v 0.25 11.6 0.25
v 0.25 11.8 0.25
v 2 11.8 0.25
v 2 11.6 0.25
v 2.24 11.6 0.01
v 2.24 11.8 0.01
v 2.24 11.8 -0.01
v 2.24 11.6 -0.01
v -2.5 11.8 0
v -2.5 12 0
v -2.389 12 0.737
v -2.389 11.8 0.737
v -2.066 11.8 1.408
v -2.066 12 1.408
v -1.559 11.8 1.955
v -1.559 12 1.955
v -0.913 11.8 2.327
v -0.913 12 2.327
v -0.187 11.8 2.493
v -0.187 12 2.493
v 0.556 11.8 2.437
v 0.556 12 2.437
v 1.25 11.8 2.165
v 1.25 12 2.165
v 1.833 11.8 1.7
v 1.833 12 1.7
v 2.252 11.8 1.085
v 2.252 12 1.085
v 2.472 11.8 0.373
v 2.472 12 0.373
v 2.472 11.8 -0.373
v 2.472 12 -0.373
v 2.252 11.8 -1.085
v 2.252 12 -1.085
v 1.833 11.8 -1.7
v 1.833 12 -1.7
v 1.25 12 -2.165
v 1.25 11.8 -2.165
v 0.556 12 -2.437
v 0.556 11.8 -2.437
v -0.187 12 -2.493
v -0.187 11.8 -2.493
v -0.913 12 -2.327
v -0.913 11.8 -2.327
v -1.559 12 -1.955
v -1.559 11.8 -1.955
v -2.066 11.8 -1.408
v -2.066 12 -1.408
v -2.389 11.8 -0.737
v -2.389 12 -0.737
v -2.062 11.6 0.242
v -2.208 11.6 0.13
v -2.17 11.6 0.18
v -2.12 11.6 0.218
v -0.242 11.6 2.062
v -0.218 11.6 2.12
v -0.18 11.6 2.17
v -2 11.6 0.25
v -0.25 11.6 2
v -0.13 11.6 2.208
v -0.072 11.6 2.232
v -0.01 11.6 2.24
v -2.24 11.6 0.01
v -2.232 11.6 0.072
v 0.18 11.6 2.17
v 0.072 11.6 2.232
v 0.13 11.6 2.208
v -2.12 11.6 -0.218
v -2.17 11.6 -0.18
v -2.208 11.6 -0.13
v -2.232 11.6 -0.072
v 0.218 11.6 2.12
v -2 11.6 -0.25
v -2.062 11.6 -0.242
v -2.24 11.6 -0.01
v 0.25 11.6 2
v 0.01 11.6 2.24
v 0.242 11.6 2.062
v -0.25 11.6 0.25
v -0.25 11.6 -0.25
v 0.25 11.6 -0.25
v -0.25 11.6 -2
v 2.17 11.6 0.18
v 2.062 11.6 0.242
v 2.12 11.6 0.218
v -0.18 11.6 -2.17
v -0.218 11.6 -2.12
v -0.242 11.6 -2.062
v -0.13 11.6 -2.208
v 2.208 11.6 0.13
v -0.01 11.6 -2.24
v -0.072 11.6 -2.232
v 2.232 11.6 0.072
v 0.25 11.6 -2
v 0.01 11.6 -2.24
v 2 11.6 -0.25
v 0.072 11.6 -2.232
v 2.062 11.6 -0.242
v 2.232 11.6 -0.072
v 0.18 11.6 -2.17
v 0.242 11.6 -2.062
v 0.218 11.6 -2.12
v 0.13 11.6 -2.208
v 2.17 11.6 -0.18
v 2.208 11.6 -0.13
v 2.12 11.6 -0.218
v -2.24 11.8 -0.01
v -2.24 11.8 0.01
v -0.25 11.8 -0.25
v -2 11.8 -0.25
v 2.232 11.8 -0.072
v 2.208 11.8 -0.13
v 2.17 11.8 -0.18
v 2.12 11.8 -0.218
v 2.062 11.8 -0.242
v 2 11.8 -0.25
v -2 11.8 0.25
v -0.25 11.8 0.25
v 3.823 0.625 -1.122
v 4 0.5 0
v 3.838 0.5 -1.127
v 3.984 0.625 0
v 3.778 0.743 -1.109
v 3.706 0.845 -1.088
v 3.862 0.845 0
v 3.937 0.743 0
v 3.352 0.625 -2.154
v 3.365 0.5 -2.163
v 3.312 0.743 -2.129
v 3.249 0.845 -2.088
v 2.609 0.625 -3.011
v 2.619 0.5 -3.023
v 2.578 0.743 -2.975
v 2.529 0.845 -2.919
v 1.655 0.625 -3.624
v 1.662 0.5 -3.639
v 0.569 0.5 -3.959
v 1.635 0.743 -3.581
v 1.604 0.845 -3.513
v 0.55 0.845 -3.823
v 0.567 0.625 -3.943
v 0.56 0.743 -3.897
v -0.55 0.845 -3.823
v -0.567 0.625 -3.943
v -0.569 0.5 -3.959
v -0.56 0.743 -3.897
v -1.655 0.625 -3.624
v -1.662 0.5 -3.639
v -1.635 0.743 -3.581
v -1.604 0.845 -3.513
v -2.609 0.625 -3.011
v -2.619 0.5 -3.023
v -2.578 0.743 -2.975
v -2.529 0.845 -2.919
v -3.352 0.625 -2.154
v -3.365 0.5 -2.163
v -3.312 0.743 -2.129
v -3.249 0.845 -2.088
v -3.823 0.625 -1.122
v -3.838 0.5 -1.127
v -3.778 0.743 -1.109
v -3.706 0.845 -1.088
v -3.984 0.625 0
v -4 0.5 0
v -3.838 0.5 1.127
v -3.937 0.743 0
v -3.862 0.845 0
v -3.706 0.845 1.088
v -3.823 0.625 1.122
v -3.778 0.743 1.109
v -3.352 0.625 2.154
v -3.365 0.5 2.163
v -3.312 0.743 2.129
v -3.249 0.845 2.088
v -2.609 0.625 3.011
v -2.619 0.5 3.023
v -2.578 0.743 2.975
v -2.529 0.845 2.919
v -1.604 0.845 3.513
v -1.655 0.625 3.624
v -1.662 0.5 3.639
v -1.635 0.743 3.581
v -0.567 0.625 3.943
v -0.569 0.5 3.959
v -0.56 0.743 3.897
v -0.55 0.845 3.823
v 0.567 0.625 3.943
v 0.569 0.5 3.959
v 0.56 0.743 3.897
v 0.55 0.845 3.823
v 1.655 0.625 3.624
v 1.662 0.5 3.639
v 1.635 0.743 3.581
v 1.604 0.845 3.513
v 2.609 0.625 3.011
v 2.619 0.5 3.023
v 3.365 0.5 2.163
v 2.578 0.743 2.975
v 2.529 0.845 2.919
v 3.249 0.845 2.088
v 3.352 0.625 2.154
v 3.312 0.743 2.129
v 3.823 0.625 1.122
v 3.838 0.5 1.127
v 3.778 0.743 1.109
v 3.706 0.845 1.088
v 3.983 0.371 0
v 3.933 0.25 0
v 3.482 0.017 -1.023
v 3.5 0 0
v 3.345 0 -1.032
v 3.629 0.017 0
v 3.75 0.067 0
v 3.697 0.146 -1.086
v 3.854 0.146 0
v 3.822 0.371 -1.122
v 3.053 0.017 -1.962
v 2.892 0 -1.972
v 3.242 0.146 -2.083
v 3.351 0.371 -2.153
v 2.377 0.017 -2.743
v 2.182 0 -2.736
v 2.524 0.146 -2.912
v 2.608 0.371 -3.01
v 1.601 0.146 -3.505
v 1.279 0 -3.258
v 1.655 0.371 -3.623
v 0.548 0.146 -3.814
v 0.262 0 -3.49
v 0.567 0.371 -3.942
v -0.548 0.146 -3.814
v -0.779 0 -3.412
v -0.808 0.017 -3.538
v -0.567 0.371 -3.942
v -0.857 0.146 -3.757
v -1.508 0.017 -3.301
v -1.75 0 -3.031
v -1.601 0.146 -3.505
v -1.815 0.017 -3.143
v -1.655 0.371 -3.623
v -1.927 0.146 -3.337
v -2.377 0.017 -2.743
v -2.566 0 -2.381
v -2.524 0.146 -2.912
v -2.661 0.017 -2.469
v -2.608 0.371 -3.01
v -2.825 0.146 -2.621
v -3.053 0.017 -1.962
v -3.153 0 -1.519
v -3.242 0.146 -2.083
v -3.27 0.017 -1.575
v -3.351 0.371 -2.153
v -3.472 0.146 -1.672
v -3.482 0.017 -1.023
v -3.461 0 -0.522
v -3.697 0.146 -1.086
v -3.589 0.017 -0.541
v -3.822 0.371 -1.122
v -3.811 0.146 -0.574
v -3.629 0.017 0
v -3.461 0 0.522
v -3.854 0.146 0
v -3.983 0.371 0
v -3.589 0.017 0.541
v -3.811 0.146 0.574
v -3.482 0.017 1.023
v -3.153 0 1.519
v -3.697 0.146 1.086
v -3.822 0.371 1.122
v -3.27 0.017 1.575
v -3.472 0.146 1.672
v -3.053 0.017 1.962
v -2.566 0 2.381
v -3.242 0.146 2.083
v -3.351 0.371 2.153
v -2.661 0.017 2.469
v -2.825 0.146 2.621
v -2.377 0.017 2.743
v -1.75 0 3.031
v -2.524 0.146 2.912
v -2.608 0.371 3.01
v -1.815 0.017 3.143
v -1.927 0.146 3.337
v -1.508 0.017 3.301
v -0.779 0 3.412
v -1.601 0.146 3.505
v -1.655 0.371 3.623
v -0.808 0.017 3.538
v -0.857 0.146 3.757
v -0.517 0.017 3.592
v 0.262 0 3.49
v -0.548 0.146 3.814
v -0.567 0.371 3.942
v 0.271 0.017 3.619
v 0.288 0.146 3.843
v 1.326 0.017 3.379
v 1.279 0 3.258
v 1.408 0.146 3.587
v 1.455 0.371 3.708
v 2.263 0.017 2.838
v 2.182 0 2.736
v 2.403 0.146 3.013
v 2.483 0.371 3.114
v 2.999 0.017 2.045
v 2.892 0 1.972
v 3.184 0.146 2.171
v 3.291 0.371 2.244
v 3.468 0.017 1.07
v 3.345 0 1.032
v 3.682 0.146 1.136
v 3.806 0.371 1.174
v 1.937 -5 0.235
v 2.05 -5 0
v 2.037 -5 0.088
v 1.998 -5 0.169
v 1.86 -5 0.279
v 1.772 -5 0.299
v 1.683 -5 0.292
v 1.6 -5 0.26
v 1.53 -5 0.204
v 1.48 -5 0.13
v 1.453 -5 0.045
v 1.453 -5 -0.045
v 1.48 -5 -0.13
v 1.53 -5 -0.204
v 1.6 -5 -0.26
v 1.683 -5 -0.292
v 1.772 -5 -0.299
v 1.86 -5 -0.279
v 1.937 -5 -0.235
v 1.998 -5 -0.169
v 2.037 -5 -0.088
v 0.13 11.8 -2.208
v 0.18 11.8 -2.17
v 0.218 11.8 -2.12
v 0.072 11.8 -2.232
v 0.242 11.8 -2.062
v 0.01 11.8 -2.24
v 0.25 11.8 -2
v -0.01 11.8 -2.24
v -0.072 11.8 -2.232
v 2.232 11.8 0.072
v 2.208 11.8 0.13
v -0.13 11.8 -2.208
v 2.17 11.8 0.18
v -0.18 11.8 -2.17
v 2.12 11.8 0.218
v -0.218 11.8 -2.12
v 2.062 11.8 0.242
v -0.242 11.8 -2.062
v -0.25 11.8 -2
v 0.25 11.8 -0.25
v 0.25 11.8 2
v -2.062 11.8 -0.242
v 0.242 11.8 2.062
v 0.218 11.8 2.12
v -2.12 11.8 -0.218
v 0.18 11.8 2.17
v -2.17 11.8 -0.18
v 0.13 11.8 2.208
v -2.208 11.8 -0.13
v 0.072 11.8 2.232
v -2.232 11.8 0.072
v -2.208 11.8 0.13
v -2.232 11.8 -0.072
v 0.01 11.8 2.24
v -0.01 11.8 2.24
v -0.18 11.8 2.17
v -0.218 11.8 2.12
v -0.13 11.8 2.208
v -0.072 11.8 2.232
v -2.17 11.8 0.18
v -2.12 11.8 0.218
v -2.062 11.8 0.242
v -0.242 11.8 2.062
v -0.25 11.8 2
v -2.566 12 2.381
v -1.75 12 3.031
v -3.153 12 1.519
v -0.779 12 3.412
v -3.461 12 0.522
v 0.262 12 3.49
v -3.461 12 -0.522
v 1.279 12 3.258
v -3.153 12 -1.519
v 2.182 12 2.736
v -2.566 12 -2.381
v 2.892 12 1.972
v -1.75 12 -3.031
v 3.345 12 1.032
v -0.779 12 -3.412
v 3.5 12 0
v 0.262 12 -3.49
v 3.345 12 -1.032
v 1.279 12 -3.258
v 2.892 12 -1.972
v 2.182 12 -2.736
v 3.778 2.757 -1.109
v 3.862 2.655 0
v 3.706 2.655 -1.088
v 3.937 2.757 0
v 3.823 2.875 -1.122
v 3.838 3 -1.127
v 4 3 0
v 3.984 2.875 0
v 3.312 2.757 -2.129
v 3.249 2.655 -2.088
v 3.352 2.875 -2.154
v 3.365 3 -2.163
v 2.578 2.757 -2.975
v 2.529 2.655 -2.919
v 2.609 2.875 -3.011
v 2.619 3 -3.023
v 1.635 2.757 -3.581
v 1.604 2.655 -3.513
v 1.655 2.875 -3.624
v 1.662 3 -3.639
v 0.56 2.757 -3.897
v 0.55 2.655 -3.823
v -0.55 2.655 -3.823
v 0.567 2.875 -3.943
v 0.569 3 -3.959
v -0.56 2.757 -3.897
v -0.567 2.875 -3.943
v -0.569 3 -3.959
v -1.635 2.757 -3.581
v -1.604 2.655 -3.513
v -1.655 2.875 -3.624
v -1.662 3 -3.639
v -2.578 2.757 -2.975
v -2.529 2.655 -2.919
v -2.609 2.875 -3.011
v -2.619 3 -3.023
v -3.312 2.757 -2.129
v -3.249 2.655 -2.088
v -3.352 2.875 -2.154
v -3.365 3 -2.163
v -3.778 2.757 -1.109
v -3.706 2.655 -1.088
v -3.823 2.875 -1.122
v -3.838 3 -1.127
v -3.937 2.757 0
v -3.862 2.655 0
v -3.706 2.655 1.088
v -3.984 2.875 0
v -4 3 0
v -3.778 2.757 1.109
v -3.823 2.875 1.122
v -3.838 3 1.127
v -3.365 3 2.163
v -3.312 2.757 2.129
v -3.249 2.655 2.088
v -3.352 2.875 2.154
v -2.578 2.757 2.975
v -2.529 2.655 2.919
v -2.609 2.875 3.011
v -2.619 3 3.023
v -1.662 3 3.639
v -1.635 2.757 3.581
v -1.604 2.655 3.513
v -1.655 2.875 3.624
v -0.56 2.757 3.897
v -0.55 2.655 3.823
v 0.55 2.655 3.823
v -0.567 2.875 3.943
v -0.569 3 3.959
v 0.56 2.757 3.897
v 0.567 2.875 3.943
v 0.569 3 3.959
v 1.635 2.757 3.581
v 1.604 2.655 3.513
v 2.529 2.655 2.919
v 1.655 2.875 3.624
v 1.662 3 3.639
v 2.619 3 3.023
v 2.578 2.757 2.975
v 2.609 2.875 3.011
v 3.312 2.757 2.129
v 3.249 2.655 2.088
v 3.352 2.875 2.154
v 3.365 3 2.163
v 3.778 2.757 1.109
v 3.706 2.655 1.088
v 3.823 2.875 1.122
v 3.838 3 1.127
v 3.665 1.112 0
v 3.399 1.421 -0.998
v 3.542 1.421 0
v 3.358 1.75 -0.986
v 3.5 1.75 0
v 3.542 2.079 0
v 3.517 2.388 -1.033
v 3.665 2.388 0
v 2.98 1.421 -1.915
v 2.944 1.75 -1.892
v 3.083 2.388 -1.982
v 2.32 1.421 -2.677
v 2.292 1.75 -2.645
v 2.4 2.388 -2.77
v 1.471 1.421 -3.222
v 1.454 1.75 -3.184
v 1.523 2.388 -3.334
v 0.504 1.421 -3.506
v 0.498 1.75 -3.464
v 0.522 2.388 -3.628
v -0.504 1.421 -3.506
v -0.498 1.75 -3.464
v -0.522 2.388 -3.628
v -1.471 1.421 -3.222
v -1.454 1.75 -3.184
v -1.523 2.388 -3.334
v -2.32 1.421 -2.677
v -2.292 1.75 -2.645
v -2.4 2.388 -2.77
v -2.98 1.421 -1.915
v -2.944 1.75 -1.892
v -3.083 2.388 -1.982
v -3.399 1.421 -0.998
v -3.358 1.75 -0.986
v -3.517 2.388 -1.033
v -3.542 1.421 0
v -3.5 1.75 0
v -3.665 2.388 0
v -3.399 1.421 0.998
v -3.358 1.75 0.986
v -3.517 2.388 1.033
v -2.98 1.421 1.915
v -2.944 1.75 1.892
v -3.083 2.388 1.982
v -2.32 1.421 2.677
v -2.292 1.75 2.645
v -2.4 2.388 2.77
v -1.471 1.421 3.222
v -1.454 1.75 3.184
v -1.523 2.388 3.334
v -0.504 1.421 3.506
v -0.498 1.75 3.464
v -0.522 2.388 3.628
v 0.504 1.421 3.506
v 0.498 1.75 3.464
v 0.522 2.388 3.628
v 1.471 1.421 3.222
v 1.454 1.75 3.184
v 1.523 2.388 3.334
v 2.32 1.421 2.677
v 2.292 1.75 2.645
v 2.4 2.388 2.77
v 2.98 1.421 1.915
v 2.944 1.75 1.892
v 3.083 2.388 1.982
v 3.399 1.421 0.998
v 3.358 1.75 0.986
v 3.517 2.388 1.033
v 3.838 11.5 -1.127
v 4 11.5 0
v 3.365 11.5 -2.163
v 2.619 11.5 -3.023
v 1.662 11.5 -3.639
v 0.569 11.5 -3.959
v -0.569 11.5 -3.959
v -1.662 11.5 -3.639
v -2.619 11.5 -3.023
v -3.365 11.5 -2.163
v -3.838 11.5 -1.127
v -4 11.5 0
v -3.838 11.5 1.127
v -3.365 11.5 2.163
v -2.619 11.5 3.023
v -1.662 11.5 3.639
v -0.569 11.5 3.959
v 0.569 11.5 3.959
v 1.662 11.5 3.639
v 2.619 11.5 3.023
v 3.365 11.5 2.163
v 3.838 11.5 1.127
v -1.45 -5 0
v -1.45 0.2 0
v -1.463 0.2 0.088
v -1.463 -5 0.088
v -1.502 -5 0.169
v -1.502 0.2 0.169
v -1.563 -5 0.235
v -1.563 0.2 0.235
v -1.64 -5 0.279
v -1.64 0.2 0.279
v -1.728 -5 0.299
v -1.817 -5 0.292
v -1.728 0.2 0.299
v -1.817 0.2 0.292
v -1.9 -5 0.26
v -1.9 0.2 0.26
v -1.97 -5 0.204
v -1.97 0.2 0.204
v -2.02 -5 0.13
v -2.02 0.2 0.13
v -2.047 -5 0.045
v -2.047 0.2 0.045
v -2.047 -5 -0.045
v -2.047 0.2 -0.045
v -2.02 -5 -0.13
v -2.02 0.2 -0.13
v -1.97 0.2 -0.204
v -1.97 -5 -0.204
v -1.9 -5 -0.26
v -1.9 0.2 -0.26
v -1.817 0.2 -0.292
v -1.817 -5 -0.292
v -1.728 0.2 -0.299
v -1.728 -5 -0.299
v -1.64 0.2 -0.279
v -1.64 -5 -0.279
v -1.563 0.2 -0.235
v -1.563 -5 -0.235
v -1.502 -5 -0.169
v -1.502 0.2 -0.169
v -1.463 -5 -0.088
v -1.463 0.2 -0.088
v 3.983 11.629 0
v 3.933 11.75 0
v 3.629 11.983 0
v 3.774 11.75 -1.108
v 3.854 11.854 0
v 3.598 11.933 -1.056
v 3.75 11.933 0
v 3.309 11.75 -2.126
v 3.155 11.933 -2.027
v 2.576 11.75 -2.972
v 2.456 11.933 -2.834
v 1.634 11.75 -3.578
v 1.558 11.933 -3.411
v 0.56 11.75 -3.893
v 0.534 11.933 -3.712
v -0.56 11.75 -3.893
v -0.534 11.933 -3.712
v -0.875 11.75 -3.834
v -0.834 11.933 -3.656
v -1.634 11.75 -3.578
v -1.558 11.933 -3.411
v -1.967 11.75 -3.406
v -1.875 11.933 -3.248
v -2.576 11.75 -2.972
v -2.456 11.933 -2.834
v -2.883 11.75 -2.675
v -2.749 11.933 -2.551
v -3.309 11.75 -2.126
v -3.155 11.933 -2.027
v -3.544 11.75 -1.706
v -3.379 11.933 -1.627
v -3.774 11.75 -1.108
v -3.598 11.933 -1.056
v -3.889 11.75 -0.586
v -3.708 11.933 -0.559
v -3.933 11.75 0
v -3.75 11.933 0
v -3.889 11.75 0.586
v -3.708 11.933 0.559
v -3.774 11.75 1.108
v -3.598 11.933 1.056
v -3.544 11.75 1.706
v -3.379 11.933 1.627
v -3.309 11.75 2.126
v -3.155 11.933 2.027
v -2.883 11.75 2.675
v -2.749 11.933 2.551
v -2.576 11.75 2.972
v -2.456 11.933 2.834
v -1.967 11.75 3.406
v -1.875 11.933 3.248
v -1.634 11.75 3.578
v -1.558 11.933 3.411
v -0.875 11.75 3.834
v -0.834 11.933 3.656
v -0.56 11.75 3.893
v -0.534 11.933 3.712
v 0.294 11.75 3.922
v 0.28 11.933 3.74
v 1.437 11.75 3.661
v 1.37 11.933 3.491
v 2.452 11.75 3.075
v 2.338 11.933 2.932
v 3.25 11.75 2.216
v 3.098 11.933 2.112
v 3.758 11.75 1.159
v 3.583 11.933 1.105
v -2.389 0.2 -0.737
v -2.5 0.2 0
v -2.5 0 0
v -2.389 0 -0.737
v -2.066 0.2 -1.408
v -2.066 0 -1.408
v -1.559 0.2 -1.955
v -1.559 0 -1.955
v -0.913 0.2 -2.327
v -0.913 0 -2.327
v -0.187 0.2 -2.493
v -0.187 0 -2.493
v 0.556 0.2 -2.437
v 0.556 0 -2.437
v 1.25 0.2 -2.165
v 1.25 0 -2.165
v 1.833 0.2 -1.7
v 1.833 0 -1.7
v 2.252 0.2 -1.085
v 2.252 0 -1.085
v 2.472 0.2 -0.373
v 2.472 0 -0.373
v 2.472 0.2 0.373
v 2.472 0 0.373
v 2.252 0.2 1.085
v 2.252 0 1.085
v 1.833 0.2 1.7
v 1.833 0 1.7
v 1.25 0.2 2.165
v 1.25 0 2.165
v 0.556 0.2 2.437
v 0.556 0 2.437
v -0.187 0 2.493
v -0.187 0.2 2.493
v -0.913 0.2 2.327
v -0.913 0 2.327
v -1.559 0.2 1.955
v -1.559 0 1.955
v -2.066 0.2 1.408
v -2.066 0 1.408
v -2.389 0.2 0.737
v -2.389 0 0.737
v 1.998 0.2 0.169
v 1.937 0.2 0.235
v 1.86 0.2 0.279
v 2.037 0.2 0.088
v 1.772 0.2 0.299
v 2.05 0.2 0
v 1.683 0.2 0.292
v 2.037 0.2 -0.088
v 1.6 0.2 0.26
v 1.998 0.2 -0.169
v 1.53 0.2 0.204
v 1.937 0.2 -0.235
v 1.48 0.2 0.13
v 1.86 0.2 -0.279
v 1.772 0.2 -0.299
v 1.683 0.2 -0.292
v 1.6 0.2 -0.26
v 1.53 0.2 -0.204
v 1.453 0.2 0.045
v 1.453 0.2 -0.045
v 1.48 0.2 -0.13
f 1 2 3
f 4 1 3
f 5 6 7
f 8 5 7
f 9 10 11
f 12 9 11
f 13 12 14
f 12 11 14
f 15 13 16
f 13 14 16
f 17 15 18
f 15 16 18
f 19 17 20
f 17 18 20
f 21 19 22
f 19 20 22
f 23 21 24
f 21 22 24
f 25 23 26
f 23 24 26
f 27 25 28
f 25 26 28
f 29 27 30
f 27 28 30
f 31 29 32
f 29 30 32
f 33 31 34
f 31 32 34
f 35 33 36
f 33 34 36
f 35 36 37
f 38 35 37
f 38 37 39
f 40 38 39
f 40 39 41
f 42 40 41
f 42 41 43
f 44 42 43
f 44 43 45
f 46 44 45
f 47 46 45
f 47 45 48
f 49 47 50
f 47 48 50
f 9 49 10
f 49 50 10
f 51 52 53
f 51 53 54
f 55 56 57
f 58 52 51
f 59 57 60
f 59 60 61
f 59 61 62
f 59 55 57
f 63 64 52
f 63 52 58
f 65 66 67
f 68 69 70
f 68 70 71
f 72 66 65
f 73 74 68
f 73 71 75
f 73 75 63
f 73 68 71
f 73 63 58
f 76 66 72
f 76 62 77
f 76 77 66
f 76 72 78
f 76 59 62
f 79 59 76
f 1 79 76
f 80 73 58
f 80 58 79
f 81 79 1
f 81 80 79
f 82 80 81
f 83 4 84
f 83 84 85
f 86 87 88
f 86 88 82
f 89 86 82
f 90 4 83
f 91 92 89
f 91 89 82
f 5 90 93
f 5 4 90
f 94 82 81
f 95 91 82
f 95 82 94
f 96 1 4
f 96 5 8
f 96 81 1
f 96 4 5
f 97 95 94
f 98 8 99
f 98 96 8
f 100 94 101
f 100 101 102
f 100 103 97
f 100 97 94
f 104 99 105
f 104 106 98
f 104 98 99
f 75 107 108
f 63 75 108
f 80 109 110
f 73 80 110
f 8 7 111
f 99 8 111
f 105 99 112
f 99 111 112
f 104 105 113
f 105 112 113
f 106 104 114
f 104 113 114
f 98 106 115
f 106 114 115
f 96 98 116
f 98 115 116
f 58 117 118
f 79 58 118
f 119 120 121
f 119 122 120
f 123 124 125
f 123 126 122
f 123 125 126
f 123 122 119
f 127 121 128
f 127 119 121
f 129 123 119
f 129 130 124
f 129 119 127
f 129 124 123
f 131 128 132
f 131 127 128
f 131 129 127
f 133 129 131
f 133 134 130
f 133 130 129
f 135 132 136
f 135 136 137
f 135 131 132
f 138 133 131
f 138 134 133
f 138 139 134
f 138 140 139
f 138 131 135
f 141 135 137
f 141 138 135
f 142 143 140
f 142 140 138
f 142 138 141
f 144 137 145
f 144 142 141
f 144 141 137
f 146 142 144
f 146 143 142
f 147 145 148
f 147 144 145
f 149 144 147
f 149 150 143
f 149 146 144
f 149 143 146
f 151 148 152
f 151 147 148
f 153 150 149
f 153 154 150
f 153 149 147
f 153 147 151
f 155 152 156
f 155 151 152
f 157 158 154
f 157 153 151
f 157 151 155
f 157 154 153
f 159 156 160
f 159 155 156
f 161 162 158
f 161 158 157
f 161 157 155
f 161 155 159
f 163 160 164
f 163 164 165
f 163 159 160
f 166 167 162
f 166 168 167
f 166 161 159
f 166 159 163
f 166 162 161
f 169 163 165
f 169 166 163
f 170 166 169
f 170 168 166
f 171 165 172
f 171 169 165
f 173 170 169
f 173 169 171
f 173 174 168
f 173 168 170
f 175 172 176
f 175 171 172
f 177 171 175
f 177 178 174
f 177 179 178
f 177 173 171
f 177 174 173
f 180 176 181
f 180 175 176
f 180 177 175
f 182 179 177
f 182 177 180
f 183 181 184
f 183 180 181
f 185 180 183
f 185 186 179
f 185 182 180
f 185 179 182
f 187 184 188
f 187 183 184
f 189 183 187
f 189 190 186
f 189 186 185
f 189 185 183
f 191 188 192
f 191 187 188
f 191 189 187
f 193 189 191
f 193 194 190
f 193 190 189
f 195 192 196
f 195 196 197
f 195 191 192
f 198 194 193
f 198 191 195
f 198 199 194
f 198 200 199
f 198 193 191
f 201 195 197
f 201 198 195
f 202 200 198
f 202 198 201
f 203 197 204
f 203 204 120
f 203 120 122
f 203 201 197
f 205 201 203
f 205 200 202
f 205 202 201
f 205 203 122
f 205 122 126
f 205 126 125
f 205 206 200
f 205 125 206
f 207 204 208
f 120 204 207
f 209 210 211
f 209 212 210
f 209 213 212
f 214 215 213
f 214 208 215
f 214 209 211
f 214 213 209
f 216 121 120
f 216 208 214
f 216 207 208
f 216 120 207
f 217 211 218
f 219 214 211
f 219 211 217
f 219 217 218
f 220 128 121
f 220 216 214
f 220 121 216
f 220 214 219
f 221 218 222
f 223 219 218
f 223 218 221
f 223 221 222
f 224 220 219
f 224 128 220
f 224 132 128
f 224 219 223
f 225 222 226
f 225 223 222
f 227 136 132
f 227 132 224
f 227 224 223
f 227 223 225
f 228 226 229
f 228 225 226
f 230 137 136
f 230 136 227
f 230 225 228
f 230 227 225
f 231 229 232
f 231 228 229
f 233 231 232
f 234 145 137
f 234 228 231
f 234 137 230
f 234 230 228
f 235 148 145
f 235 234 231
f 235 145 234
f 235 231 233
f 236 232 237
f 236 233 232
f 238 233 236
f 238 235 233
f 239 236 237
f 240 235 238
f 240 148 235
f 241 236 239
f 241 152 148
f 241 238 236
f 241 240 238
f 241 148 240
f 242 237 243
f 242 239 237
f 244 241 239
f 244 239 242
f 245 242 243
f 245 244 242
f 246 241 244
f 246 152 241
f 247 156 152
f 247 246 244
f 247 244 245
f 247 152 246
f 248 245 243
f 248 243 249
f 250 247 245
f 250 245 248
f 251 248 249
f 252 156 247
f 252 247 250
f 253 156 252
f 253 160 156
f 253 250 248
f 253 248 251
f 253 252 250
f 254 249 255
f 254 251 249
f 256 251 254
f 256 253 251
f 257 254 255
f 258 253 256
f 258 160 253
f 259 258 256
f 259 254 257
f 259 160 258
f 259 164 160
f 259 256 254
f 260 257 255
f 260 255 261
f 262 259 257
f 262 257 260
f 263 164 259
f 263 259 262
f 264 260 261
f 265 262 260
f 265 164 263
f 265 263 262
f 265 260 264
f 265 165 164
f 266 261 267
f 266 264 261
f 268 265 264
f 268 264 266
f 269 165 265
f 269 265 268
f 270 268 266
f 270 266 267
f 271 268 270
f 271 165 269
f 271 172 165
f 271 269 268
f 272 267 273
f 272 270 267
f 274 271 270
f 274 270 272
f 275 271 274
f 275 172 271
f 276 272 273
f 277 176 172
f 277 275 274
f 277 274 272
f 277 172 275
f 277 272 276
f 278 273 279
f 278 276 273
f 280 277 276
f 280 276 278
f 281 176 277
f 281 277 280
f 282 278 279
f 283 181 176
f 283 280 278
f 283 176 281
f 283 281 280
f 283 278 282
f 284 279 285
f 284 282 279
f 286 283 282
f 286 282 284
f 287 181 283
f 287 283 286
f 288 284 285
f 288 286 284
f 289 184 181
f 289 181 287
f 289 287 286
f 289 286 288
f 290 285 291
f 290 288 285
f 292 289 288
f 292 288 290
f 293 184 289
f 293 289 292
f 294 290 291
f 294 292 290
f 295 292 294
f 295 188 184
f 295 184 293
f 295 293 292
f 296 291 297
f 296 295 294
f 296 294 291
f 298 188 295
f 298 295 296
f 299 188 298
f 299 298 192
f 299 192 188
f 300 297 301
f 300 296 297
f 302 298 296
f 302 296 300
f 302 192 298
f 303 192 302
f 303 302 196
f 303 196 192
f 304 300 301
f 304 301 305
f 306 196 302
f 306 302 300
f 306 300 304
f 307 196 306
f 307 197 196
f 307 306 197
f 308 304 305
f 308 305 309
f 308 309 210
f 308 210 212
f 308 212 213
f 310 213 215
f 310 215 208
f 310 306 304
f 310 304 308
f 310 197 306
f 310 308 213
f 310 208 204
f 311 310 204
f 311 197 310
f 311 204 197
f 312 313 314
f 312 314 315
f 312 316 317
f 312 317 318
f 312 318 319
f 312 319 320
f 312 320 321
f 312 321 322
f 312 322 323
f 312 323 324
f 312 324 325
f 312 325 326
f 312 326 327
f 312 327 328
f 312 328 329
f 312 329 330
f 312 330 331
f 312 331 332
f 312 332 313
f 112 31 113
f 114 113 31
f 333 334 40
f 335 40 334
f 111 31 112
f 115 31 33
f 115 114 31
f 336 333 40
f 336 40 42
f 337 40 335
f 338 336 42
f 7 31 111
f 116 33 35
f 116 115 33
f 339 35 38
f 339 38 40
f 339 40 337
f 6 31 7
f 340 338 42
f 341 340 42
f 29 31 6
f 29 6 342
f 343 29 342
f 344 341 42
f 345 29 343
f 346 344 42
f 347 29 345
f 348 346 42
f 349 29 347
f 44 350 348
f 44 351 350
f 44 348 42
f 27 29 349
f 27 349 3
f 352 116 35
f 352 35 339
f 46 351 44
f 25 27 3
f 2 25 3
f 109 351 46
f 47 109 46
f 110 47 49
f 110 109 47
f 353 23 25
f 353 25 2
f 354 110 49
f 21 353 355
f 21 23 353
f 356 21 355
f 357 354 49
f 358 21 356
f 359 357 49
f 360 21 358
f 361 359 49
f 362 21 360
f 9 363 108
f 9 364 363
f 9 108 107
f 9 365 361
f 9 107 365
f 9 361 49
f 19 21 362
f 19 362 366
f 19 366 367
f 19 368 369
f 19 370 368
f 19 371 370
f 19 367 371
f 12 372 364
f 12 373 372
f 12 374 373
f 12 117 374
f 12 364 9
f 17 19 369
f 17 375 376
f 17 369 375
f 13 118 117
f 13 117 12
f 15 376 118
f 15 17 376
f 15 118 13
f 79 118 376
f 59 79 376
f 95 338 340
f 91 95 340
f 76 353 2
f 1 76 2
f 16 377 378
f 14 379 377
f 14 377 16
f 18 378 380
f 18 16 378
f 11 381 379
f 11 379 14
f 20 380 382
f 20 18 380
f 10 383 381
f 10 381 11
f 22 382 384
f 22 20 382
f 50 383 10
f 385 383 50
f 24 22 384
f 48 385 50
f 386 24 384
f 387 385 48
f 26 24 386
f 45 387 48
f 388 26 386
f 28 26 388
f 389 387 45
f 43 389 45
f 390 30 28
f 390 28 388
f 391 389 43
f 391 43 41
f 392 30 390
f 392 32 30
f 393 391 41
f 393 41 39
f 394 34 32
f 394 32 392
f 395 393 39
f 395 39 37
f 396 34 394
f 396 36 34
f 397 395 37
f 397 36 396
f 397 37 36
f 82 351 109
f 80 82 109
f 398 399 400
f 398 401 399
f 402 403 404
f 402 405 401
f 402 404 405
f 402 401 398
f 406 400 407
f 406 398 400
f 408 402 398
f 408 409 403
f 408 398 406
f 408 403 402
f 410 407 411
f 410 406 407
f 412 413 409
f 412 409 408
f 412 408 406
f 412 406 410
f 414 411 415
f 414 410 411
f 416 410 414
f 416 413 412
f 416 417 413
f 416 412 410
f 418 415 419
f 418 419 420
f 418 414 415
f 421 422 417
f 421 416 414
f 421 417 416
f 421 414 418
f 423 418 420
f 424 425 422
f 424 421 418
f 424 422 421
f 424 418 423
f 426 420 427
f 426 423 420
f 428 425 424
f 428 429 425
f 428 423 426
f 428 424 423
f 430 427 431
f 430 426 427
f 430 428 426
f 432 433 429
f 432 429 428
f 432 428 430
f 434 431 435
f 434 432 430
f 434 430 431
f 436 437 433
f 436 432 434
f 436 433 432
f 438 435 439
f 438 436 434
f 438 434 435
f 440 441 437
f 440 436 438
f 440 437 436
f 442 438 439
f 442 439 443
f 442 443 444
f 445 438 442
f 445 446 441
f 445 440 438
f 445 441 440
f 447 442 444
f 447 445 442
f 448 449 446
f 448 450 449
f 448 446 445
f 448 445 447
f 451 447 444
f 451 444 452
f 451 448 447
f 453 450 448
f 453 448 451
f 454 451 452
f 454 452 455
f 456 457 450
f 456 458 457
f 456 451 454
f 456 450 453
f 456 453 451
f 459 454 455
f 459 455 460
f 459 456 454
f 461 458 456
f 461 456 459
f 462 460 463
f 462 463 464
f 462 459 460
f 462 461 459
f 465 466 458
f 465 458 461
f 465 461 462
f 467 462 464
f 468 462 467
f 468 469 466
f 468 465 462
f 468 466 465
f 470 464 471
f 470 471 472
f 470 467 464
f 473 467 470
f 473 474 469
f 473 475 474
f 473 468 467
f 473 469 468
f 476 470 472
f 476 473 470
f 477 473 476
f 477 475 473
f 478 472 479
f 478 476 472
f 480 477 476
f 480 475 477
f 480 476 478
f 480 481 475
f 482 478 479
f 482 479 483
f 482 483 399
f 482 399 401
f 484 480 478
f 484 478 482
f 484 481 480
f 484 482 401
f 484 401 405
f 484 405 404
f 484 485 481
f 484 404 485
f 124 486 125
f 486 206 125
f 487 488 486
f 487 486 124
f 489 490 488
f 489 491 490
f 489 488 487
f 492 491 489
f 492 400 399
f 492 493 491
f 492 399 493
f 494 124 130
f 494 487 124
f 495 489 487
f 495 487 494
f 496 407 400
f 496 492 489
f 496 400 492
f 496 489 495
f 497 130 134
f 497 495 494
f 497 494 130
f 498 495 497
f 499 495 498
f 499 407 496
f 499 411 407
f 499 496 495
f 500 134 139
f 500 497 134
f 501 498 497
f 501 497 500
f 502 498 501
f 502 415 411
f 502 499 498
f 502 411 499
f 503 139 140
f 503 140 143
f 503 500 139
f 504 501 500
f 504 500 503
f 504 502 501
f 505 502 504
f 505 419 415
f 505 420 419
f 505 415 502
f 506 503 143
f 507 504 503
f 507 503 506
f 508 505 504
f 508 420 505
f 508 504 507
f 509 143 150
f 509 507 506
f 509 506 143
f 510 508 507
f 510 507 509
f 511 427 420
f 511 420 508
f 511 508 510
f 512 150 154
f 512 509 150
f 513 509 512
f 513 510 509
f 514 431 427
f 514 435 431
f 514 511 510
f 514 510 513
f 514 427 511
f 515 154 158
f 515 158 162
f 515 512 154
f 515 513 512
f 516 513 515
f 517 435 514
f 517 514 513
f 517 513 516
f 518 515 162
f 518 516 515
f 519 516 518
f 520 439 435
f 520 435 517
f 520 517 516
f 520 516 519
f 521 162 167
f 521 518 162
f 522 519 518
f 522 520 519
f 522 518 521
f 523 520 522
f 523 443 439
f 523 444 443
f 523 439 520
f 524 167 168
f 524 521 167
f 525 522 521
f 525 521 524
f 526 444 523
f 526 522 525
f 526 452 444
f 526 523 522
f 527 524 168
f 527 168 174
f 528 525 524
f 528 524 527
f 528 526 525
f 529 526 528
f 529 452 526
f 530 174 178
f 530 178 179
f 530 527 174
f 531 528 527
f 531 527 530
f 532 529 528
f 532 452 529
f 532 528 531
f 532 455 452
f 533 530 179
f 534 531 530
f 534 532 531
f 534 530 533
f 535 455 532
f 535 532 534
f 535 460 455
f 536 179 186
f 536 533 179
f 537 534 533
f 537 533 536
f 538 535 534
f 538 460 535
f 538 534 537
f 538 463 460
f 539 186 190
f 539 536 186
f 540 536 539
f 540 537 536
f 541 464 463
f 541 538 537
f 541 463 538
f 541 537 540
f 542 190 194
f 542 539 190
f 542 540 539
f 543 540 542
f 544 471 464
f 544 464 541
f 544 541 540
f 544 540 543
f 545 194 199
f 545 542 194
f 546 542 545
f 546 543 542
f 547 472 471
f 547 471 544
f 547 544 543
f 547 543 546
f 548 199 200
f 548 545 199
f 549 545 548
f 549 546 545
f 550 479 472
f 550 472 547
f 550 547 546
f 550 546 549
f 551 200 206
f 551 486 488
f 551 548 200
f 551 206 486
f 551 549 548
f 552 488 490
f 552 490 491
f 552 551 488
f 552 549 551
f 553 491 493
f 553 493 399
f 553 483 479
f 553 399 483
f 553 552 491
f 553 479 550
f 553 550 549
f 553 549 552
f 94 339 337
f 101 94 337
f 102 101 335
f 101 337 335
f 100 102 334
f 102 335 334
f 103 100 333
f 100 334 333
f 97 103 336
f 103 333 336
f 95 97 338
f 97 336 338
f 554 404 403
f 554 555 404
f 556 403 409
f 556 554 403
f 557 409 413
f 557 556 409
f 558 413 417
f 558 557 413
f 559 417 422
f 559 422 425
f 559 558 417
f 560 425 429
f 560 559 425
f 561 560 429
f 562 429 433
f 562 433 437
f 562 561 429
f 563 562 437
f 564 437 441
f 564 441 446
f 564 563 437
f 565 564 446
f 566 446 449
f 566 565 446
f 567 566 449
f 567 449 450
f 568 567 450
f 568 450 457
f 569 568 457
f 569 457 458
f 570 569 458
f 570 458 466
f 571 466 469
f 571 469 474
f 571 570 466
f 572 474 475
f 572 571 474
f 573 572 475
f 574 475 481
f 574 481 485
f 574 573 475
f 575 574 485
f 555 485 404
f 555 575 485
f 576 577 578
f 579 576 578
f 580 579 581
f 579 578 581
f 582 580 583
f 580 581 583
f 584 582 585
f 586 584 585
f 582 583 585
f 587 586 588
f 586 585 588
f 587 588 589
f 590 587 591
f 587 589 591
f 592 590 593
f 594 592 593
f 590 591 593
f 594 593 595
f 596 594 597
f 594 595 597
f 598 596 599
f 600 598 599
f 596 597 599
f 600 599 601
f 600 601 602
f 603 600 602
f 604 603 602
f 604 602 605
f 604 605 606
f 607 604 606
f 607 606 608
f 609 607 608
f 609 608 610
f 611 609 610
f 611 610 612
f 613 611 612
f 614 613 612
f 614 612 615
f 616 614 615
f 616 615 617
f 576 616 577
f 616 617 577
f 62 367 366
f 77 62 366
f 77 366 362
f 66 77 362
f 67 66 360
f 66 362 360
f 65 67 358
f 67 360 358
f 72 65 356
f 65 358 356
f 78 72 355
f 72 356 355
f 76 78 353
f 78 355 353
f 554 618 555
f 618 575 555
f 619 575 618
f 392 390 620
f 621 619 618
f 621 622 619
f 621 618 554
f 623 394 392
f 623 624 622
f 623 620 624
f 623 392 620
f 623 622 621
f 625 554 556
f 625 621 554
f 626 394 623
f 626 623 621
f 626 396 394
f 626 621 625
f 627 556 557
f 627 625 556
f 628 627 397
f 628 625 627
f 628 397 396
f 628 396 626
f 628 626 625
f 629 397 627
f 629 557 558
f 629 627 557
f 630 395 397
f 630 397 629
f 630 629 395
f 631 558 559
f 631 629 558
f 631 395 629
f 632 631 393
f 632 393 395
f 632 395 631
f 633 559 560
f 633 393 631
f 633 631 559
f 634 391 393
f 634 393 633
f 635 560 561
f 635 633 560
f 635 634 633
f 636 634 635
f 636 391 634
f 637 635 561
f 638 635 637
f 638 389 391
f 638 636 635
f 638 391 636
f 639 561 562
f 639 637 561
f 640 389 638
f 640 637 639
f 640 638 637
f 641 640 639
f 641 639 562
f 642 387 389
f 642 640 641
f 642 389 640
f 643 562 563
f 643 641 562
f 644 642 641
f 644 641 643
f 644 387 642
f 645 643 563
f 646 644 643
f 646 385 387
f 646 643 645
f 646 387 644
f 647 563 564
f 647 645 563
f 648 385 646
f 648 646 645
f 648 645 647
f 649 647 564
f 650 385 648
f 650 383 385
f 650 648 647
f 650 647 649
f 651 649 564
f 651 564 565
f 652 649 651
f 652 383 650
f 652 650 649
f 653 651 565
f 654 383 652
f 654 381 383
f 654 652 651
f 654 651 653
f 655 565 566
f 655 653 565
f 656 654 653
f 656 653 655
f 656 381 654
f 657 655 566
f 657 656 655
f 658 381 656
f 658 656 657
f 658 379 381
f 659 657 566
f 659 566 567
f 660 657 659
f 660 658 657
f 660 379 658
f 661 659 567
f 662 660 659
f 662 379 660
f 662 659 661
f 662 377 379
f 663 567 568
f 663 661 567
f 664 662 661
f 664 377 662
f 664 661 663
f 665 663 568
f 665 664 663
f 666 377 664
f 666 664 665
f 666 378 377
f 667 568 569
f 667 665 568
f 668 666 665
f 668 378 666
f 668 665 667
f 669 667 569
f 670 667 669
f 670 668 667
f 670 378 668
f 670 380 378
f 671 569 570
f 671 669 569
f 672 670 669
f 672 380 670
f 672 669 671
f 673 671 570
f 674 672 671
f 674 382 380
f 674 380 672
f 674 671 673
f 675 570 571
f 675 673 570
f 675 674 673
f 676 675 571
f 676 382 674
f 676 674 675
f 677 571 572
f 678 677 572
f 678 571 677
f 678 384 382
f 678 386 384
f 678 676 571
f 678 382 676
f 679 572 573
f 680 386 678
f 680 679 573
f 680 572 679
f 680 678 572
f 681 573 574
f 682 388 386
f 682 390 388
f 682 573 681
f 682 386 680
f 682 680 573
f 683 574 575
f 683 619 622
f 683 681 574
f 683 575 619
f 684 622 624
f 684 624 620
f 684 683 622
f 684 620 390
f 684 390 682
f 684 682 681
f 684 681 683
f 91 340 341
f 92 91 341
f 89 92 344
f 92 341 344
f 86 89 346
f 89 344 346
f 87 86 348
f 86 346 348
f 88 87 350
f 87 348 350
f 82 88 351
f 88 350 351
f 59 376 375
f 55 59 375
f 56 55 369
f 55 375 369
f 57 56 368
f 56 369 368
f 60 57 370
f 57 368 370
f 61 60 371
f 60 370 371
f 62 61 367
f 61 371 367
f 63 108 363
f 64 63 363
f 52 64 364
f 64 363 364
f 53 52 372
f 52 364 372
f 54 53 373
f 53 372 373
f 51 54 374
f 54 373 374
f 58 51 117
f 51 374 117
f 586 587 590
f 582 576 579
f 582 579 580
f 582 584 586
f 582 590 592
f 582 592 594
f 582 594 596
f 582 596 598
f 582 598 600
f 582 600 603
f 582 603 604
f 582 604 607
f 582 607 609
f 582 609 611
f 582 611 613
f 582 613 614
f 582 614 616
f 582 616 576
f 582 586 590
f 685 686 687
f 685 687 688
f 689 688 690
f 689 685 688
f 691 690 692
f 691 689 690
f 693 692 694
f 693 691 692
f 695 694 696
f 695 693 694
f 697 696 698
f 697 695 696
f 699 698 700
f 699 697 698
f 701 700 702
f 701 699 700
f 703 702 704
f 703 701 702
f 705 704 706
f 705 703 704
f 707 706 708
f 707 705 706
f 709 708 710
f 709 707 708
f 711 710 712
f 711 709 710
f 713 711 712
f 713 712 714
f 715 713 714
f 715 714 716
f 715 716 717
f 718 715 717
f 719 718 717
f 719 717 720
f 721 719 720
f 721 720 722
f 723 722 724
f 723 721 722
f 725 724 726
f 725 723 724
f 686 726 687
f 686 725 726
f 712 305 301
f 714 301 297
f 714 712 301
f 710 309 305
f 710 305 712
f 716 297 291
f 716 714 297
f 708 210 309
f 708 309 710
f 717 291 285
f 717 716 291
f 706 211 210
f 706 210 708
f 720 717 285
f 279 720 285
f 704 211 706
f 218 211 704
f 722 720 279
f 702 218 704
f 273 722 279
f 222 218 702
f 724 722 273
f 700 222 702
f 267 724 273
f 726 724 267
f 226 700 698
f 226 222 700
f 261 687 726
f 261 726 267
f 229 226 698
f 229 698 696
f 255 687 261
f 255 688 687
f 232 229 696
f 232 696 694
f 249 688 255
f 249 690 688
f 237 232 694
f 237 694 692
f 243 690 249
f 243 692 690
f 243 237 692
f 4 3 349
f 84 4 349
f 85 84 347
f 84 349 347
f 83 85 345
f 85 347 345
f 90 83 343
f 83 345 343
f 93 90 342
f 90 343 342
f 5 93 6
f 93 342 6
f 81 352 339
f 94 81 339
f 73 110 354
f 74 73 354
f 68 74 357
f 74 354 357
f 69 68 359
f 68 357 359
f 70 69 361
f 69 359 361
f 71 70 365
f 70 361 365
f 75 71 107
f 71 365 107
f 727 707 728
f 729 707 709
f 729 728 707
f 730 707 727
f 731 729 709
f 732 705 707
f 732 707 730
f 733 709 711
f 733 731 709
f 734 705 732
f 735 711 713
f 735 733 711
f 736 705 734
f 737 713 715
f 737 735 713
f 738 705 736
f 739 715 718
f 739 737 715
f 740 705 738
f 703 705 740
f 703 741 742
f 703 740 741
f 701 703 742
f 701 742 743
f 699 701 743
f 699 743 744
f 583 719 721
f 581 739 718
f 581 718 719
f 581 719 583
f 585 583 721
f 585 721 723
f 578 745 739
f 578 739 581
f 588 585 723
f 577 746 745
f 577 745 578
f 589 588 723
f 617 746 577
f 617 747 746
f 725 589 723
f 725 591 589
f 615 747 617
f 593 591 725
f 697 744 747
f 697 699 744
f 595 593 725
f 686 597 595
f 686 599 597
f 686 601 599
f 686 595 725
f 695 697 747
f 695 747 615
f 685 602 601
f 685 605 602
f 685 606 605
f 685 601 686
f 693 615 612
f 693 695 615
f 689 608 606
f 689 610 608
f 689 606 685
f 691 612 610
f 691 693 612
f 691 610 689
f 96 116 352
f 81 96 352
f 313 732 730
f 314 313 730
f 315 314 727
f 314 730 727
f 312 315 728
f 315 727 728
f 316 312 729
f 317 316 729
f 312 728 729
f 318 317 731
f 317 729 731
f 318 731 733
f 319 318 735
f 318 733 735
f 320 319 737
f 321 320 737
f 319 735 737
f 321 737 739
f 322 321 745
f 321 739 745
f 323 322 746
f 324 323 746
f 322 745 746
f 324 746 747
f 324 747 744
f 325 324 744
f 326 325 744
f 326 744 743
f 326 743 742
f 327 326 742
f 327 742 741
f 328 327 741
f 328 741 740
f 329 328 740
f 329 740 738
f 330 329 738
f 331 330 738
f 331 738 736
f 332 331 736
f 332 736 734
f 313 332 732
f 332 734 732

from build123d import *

# Parameters (mm, degrees)
SKETCH_3_R          = 2.5
CUT_EXTRUDE_1_DEPTH = 0.2
CUT_EXTRUDE_2_DEPTH = 0.2
CUT_EXTRUDE_START   = -0.2
SKETCH_5_R          = 2.5
CUT_EXTRUDE_3_DEPTH = 0.2
SKETCH_7_R          = 0.3
EXTRUDE_2_DEPTH     = 5.2


with BuildPart() as part:
    # Эскиз2 → Повернуть1 (revolve)
    with BuildSketch(Plane.XY):
        with BuildLine():
            Line((0, 0), (3.5, 0))
            ThreePointArc((3.5, 0), (3.853553391, 0.146446609), (4, 0.5))
            ThreePointArc((4, 0.5), (3.964238345, 0.685695338), (3.862068966, 0.844827586))
            ThreePointArc((3.862068966, 0.844827586), (3.5, 1.75), (3.862068966, 2.655172414))
            ThreePointArc((3.862068966, 2.655172414), (3.964238345, 2.814304662), (4, 3))
            Line((4, 3), (4, 11.5))
            ThreePointArc((4, 11.5), (3.853553391, 11.853553391), (3.5, 12))
            Line((3.5, 12), (0, 12))
            Line((0, 12), (0, 0))
        make_face()
    revolve(axis=Axis((0, 0, 0), (0, 1, 0)))

    # Эскиз3 → Вырез-Вытянуть1 (cut)
    with BuildSketch(Plane(origin=(0, 12, 0), x_dir=(1, 0, 0), z_dir=(0, 1, 0))):
        with Locations(Location((0, 0, 0), (0, 0, 180))):
            Circle(SKETCH_3_R)
    extrude(amount=-CUT_EXTRUDE_1_DEPTH, mode=Mode.SUBTRACT)

    # Эскиз4 → Вырез-Вытянуть2 (cut)
    with BuildSketch(Plane(origin=(0, 11.8, 0), x_dir=(1, 0, 0), z_dir=(0, 1, 0))):
        with BuildLine():
            Line((-0.25, -0.25), (-0.25, -2))
            ThreePointArc((-0.25, -2), (-0.179705627, -2.169705627), (-0.01, -2.24))
            Line((-0.01, -2.24), (0.01, -2.24))
            ThreePointArc((0.01, -2.24), (0.179705627, -2.169705627), (0.25, -2))
            Line((0.25, -2), (0.25, -0.25))
            Line((0.25, -0.25), (2, -0.25))
            ThreePointArc((2, -0.25), (2.169705627, -0.179705627), (2.24, -0.01))
            Line((2.24, -0.01), (2.24, 0.01))
            ThreePointArc((2.24, 0.01), (2.169705627, 0.179705627), (2, 0.25))
            Line((2, 0.25), (0.25, 0.25))
            Line((0.25, 0.25), (0.25, 2))
            ThreePointArc((0.25, 2), (0.179705627, 2.169705627), (0.01, 2.24))
            Line((0.01, 2.24), (-0.01, 2.24))
            ThreePointArc((-0.01, 2.24), (-0.179705627, 2.169705627), (-0.25, 2))
            Line((-0.25, 2), (-0.25, 0.25))
            Line((-0.25, 0.25), (-2, 0.25))
            ThreePointArc((-2, 0.25), (-2.169705627, 0.179705627), (-2.24, 0.01))
            Line((-2.24, 0.01), (-2.24, -0.01))
            ThreePointArc((-2.24, -0.01), (-2.169705627, -0.179705627), (-2, -0.25))
            Line((-2, -0.25), (-0.25, -0.25))
        make_face()
    extrude(amount=-CUT_EXTRUDE_2_DEPTH, mode=Mode.SUBTRACT)

    # Эскиз5 → Вырез-Вытянуть3 (cut)
    with BuildSketch(Plane.XZ.offset(CUT_EXTRUDE_START)):
        with Locations(Location((0, 0, 0), (0, 0, 180))):
            Circle(SKETCH_5_R)
    extrude(amount=CUT_EXTRUDE_3_DEPTH, mode=Mode.SUBTRACT)

    # Эскиз7 → Бобышка-Вытянуть2 (add)
    with BuildSketch(Plane.XZ.offset(-0.2)):
        with Locations((-1.75, 0)):
            Circle(SKETCH_7_R)
        with Locations((1.75, 0)):
            Circle(SKETCH_7_R)
    extrude(amount=EXTRUDE_2_DEPTH)


solid = part.part
